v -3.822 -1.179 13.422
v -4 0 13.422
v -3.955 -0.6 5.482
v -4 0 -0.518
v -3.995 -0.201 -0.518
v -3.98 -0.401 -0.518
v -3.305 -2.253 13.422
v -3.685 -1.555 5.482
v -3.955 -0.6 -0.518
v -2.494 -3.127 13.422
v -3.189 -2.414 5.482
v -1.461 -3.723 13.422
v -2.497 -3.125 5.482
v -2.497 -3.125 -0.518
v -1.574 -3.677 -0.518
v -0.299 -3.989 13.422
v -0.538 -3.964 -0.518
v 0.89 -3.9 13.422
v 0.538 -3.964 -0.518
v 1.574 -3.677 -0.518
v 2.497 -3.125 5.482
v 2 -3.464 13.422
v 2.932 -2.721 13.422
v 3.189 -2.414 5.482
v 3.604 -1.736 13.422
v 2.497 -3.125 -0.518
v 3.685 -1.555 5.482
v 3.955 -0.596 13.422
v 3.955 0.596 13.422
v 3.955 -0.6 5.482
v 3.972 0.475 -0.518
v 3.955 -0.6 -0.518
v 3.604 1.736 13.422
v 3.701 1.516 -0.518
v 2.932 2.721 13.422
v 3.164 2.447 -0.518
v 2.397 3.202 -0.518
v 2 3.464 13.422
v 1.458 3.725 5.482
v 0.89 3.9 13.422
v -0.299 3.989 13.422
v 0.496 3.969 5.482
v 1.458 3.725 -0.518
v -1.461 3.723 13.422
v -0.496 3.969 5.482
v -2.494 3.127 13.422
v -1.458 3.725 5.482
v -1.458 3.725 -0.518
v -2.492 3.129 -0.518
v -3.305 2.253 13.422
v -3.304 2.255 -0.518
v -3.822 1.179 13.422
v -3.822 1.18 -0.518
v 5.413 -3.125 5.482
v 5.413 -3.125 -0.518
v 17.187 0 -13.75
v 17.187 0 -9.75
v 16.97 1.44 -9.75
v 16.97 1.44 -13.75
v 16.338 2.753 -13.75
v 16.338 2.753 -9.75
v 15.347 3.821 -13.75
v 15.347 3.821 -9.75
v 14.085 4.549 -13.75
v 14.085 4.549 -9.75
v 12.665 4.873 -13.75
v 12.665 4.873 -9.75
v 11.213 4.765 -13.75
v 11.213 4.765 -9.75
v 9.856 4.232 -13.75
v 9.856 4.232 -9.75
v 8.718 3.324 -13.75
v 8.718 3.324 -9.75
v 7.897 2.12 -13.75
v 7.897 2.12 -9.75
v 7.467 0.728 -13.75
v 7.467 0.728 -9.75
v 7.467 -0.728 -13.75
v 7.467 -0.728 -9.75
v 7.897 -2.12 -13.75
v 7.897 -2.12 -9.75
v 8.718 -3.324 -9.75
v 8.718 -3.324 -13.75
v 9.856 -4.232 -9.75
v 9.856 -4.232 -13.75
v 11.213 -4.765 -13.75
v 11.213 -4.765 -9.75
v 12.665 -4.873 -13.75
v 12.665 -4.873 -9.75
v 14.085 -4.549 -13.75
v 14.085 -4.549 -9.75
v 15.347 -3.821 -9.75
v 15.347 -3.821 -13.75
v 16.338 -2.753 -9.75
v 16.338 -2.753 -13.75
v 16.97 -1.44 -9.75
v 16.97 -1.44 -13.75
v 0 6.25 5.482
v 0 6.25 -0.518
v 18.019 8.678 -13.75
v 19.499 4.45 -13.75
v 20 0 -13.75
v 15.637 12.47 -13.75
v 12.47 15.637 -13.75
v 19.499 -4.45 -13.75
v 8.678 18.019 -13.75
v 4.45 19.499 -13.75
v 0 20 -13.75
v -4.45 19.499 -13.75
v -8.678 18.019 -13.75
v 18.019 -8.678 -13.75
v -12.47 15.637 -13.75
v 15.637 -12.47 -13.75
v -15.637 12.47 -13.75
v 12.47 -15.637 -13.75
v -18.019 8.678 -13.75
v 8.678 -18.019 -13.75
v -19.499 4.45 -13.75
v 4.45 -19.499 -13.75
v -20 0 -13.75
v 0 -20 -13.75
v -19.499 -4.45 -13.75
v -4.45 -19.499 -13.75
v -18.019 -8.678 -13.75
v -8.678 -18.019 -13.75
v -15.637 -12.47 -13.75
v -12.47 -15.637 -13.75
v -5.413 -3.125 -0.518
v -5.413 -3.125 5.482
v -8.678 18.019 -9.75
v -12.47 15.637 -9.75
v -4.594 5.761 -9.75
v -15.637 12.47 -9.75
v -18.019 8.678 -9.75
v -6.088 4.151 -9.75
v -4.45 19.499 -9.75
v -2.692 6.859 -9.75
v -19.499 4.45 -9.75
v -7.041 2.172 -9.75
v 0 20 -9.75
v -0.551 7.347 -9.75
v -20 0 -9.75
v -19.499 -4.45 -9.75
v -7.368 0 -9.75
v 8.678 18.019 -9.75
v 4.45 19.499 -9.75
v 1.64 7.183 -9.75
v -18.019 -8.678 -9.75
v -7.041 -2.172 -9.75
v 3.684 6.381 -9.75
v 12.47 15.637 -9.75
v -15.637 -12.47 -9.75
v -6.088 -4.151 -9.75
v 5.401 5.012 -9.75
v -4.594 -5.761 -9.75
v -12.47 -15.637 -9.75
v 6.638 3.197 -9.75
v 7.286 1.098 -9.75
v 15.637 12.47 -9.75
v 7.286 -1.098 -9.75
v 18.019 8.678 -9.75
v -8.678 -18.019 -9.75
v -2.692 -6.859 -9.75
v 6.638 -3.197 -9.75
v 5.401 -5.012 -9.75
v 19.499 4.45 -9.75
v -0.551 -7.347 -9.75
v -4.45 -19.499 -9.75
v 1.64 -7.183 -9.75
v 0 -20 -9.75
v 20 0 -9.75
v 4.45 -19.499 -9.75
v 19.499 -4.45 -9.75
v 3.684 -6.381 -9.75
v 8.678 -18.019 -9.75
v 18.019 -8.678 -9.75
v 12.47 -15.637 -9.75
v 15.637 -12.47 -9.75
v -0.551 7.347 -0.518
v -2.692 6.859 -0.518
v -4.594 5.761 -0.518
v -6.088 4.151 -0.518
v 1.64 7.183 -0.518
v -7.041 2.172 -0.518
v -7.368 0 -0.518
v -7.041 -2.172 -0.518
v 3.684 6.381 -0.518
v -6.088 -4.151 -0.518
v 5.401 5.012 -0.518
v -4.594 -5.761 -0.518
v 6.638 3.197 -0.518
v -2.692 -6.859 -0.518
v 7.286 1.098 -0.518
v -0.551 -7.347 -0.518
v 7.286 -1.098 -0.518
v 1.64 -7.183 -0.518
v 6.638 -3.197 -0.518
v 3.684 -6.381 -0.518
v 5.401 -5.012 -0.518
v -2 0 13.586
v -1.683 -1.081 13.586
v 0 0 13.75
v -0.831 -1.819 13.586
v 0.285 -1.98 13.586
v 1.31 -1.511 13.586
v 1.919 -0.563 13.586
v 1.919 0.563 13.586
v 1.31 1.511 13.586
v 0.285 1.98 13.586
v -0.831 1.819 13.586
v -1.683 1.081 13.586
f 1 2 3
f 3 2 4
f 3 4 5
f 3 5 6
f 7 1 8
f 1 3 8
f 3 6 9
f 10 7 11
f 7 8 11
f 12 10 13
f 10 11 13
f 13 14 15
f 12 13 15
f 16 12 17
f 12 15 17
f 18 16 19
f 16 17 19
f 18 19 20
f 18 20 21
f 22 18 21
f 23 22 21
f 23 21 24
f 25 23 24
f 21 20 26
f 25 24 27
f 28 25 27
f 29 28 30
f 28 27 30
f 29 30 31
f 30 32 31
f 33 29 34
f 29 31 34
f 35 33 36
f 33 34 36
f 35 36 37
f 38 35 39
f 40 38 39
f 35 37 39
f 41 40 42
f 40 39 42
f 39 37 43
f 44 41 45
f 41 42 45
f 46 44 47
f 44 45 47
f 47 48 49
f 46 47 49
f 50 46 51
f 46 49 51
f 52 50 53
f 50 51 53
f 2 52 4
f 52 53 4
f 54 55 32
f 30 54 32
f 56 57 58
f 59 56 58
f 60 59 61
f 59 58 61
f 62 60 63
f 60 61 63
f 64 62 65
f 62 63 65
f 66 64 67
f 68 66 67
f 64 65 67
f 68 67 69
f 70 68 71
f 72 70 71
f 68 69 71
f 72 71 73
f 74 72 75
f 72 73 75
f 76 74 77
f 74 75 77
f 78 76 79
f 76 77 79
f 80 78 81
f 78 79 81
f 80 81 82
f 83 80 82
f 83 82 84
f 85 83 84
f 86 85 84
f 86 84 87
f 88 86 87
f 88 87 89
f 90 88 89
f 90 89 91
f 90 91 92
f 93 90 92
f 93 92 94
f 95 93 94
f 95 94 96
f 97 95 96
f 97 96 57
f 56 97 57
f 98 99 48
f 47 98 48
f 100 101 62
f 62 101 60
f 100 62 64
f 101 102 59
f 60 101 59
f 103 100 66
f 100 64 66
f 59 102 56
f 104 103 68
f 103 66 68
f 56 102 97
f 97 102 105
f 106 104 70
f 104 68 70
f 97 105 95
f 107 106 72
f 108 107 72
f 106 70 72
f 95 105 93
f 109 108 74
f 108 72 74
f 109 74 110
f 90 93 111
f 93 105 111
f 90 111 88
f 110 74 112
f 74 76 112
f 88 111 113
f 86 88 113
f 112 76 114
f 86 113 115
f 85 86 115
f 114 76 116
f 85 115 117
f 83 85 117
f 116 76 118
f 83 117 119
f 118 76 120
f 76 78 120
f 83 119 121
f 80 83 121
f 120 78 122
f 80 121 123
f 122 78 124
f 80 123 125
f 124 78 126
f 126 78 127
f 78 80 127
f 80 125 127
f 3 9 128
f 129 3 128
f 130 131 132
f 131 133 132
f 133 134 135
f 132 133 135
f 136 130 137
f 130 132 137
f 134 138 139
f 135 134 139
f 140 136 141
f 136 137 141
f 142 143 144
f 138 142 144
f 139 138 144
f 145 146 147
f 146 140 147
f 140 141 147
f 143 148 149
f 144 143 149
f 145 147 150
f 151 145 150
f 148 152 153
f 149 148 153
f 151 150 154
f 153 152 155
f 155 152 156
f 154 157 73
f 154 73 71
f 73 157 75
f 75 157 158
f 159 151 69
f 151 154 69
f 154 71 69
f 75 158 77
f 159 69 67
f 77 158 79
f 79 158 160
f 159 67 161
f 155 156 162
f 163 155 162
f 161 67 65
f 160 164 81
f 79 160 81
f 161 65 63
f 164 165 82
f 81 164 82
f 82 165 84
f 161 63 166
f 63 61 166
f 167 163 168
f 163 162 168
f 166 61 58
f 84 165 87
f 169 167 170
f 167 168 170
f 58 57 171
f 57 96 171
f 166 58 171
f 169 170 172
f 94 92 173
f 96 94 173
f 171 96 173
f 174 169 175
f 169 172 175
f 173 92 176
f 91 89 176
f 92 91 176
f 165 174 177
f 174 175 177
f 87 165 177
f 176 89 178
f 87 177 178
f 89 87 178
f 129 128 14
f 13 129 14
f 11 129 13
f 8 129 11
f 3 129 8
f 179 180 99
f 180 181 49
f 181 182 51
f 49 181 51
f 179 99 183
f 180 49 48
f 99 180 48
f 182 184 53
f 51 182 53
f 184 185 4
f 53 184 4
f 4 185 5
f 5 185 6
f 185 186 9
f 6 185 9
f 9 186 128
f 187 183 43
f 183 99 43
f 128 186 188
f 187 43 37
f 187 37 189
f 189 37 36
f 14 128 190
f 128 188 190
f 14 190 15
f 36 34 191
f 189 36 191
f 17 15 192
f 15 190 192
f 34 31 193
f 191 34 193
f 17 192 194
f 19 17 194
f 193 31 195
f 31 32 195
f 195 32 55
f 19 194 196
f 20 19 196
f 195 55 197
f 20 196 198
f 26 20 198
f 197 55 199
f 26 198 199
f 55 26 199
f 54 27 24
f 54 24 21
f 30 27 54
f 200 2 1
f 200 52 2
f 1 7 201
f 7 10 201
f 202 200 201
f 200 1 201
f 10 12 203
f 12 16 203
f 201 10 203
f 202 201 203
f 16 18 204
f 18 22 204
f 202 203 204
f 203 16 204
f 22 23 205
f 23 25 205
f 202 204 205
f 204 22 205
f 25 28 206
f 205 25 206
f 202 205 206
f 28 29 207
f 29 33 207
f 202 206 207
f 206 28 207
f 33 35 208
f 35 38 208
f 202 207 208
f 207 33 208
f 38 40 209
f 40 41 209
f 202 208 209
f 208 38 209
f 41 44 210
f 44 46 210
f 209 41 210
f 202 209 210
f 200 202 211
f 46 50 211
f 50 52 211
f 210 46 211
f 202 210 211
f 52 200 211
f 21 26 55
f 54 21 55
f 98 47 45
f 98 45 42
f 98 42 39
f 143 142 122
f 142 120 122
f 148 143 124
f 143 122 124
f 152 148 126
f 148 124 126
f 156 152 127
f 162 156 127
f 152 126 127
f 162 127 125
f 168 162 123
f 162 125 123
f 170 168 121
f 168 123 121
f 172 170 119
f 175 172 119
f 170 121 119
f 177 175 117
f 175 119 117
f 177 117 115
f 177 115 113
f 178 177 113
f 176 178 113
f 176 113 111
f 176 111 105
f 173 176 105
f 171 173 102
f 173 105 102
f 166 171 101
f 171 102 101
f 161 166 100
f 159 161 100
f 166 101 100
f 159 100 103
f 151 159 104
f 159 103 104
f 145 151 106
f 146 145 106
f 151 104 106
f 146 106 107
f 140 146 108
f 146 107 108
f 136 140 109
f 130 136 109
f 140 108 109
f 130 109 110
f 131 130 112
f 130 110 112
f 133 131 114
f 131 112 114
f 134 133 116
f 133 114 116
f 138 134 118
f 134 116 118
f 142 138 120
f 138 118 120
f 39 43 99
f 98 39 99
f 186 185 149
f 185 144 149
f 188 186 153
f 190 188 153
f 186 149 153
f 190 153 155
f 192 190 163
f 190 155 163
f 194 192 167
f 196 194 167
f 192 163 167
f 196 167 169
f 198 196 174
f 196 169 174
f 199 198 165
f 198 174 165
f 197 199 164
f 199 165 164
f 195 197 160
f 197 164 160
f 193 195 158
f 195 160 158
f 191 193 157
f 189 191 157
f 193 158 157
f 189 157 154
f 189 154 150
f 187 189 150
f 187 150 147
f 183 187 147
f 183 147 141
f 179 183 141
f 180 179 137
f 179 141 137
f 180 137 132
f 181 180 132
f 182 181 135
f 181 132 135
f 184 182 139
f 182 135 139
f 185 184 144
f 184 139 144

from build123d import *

# Parameters (mm, degrees)
F3_DEPTH = 6
F4_R     = 4.8870891215
F5_DEPTH = 4.0010006557


with BuildPart() as f1:
    # F0 (on Front) → F1 (revolve)
    with BuildSketch(Plane.XZ):
        Polygon((-7.3680463247, -9.7499769181), (-20, -9.7499769181), (-20, -13.7499775738), (0, -13.7499775738), (0, 13.7500224262), (-4, 13.4215392172), (-4, -0.5182113382), (-7.3680463247, -0.5182113382), align=None)
    revolve(axis=Axis((0, 0, 2.24262e-05), (0, 0, 1)))

    # F2 (on face) → F3 (join)
    with BuildSketch(Plane.XY.offset(-0.5182113382)):
        Polygon((-1.4578928646, 3.7248554865), (1.4578928646, 3.7248554865), (0, 6.25), align=None)
        Polygon((-3.954765909, -0.5998554865), (-5.4126587737, -3.125), (-2.4968730444, -3.125), align=None)
        Polygon((2.4968730444, -3.125), (5.4126587737, -3.125), (3.954765909, -0.5998554865), align=None)
    extrude(amount=F3_DEPTH)

    # F4 (on face) → F5 (cut, through all)
    with BuildSketch(Plane.XY.offset(-9.7499769181)):
        with Locations((12.3, 0)):
            Circle(F4_R)
    extrude(amount=-F5_DEPTH, mode=Mode.SUBTRACT)


solid = f1.part
